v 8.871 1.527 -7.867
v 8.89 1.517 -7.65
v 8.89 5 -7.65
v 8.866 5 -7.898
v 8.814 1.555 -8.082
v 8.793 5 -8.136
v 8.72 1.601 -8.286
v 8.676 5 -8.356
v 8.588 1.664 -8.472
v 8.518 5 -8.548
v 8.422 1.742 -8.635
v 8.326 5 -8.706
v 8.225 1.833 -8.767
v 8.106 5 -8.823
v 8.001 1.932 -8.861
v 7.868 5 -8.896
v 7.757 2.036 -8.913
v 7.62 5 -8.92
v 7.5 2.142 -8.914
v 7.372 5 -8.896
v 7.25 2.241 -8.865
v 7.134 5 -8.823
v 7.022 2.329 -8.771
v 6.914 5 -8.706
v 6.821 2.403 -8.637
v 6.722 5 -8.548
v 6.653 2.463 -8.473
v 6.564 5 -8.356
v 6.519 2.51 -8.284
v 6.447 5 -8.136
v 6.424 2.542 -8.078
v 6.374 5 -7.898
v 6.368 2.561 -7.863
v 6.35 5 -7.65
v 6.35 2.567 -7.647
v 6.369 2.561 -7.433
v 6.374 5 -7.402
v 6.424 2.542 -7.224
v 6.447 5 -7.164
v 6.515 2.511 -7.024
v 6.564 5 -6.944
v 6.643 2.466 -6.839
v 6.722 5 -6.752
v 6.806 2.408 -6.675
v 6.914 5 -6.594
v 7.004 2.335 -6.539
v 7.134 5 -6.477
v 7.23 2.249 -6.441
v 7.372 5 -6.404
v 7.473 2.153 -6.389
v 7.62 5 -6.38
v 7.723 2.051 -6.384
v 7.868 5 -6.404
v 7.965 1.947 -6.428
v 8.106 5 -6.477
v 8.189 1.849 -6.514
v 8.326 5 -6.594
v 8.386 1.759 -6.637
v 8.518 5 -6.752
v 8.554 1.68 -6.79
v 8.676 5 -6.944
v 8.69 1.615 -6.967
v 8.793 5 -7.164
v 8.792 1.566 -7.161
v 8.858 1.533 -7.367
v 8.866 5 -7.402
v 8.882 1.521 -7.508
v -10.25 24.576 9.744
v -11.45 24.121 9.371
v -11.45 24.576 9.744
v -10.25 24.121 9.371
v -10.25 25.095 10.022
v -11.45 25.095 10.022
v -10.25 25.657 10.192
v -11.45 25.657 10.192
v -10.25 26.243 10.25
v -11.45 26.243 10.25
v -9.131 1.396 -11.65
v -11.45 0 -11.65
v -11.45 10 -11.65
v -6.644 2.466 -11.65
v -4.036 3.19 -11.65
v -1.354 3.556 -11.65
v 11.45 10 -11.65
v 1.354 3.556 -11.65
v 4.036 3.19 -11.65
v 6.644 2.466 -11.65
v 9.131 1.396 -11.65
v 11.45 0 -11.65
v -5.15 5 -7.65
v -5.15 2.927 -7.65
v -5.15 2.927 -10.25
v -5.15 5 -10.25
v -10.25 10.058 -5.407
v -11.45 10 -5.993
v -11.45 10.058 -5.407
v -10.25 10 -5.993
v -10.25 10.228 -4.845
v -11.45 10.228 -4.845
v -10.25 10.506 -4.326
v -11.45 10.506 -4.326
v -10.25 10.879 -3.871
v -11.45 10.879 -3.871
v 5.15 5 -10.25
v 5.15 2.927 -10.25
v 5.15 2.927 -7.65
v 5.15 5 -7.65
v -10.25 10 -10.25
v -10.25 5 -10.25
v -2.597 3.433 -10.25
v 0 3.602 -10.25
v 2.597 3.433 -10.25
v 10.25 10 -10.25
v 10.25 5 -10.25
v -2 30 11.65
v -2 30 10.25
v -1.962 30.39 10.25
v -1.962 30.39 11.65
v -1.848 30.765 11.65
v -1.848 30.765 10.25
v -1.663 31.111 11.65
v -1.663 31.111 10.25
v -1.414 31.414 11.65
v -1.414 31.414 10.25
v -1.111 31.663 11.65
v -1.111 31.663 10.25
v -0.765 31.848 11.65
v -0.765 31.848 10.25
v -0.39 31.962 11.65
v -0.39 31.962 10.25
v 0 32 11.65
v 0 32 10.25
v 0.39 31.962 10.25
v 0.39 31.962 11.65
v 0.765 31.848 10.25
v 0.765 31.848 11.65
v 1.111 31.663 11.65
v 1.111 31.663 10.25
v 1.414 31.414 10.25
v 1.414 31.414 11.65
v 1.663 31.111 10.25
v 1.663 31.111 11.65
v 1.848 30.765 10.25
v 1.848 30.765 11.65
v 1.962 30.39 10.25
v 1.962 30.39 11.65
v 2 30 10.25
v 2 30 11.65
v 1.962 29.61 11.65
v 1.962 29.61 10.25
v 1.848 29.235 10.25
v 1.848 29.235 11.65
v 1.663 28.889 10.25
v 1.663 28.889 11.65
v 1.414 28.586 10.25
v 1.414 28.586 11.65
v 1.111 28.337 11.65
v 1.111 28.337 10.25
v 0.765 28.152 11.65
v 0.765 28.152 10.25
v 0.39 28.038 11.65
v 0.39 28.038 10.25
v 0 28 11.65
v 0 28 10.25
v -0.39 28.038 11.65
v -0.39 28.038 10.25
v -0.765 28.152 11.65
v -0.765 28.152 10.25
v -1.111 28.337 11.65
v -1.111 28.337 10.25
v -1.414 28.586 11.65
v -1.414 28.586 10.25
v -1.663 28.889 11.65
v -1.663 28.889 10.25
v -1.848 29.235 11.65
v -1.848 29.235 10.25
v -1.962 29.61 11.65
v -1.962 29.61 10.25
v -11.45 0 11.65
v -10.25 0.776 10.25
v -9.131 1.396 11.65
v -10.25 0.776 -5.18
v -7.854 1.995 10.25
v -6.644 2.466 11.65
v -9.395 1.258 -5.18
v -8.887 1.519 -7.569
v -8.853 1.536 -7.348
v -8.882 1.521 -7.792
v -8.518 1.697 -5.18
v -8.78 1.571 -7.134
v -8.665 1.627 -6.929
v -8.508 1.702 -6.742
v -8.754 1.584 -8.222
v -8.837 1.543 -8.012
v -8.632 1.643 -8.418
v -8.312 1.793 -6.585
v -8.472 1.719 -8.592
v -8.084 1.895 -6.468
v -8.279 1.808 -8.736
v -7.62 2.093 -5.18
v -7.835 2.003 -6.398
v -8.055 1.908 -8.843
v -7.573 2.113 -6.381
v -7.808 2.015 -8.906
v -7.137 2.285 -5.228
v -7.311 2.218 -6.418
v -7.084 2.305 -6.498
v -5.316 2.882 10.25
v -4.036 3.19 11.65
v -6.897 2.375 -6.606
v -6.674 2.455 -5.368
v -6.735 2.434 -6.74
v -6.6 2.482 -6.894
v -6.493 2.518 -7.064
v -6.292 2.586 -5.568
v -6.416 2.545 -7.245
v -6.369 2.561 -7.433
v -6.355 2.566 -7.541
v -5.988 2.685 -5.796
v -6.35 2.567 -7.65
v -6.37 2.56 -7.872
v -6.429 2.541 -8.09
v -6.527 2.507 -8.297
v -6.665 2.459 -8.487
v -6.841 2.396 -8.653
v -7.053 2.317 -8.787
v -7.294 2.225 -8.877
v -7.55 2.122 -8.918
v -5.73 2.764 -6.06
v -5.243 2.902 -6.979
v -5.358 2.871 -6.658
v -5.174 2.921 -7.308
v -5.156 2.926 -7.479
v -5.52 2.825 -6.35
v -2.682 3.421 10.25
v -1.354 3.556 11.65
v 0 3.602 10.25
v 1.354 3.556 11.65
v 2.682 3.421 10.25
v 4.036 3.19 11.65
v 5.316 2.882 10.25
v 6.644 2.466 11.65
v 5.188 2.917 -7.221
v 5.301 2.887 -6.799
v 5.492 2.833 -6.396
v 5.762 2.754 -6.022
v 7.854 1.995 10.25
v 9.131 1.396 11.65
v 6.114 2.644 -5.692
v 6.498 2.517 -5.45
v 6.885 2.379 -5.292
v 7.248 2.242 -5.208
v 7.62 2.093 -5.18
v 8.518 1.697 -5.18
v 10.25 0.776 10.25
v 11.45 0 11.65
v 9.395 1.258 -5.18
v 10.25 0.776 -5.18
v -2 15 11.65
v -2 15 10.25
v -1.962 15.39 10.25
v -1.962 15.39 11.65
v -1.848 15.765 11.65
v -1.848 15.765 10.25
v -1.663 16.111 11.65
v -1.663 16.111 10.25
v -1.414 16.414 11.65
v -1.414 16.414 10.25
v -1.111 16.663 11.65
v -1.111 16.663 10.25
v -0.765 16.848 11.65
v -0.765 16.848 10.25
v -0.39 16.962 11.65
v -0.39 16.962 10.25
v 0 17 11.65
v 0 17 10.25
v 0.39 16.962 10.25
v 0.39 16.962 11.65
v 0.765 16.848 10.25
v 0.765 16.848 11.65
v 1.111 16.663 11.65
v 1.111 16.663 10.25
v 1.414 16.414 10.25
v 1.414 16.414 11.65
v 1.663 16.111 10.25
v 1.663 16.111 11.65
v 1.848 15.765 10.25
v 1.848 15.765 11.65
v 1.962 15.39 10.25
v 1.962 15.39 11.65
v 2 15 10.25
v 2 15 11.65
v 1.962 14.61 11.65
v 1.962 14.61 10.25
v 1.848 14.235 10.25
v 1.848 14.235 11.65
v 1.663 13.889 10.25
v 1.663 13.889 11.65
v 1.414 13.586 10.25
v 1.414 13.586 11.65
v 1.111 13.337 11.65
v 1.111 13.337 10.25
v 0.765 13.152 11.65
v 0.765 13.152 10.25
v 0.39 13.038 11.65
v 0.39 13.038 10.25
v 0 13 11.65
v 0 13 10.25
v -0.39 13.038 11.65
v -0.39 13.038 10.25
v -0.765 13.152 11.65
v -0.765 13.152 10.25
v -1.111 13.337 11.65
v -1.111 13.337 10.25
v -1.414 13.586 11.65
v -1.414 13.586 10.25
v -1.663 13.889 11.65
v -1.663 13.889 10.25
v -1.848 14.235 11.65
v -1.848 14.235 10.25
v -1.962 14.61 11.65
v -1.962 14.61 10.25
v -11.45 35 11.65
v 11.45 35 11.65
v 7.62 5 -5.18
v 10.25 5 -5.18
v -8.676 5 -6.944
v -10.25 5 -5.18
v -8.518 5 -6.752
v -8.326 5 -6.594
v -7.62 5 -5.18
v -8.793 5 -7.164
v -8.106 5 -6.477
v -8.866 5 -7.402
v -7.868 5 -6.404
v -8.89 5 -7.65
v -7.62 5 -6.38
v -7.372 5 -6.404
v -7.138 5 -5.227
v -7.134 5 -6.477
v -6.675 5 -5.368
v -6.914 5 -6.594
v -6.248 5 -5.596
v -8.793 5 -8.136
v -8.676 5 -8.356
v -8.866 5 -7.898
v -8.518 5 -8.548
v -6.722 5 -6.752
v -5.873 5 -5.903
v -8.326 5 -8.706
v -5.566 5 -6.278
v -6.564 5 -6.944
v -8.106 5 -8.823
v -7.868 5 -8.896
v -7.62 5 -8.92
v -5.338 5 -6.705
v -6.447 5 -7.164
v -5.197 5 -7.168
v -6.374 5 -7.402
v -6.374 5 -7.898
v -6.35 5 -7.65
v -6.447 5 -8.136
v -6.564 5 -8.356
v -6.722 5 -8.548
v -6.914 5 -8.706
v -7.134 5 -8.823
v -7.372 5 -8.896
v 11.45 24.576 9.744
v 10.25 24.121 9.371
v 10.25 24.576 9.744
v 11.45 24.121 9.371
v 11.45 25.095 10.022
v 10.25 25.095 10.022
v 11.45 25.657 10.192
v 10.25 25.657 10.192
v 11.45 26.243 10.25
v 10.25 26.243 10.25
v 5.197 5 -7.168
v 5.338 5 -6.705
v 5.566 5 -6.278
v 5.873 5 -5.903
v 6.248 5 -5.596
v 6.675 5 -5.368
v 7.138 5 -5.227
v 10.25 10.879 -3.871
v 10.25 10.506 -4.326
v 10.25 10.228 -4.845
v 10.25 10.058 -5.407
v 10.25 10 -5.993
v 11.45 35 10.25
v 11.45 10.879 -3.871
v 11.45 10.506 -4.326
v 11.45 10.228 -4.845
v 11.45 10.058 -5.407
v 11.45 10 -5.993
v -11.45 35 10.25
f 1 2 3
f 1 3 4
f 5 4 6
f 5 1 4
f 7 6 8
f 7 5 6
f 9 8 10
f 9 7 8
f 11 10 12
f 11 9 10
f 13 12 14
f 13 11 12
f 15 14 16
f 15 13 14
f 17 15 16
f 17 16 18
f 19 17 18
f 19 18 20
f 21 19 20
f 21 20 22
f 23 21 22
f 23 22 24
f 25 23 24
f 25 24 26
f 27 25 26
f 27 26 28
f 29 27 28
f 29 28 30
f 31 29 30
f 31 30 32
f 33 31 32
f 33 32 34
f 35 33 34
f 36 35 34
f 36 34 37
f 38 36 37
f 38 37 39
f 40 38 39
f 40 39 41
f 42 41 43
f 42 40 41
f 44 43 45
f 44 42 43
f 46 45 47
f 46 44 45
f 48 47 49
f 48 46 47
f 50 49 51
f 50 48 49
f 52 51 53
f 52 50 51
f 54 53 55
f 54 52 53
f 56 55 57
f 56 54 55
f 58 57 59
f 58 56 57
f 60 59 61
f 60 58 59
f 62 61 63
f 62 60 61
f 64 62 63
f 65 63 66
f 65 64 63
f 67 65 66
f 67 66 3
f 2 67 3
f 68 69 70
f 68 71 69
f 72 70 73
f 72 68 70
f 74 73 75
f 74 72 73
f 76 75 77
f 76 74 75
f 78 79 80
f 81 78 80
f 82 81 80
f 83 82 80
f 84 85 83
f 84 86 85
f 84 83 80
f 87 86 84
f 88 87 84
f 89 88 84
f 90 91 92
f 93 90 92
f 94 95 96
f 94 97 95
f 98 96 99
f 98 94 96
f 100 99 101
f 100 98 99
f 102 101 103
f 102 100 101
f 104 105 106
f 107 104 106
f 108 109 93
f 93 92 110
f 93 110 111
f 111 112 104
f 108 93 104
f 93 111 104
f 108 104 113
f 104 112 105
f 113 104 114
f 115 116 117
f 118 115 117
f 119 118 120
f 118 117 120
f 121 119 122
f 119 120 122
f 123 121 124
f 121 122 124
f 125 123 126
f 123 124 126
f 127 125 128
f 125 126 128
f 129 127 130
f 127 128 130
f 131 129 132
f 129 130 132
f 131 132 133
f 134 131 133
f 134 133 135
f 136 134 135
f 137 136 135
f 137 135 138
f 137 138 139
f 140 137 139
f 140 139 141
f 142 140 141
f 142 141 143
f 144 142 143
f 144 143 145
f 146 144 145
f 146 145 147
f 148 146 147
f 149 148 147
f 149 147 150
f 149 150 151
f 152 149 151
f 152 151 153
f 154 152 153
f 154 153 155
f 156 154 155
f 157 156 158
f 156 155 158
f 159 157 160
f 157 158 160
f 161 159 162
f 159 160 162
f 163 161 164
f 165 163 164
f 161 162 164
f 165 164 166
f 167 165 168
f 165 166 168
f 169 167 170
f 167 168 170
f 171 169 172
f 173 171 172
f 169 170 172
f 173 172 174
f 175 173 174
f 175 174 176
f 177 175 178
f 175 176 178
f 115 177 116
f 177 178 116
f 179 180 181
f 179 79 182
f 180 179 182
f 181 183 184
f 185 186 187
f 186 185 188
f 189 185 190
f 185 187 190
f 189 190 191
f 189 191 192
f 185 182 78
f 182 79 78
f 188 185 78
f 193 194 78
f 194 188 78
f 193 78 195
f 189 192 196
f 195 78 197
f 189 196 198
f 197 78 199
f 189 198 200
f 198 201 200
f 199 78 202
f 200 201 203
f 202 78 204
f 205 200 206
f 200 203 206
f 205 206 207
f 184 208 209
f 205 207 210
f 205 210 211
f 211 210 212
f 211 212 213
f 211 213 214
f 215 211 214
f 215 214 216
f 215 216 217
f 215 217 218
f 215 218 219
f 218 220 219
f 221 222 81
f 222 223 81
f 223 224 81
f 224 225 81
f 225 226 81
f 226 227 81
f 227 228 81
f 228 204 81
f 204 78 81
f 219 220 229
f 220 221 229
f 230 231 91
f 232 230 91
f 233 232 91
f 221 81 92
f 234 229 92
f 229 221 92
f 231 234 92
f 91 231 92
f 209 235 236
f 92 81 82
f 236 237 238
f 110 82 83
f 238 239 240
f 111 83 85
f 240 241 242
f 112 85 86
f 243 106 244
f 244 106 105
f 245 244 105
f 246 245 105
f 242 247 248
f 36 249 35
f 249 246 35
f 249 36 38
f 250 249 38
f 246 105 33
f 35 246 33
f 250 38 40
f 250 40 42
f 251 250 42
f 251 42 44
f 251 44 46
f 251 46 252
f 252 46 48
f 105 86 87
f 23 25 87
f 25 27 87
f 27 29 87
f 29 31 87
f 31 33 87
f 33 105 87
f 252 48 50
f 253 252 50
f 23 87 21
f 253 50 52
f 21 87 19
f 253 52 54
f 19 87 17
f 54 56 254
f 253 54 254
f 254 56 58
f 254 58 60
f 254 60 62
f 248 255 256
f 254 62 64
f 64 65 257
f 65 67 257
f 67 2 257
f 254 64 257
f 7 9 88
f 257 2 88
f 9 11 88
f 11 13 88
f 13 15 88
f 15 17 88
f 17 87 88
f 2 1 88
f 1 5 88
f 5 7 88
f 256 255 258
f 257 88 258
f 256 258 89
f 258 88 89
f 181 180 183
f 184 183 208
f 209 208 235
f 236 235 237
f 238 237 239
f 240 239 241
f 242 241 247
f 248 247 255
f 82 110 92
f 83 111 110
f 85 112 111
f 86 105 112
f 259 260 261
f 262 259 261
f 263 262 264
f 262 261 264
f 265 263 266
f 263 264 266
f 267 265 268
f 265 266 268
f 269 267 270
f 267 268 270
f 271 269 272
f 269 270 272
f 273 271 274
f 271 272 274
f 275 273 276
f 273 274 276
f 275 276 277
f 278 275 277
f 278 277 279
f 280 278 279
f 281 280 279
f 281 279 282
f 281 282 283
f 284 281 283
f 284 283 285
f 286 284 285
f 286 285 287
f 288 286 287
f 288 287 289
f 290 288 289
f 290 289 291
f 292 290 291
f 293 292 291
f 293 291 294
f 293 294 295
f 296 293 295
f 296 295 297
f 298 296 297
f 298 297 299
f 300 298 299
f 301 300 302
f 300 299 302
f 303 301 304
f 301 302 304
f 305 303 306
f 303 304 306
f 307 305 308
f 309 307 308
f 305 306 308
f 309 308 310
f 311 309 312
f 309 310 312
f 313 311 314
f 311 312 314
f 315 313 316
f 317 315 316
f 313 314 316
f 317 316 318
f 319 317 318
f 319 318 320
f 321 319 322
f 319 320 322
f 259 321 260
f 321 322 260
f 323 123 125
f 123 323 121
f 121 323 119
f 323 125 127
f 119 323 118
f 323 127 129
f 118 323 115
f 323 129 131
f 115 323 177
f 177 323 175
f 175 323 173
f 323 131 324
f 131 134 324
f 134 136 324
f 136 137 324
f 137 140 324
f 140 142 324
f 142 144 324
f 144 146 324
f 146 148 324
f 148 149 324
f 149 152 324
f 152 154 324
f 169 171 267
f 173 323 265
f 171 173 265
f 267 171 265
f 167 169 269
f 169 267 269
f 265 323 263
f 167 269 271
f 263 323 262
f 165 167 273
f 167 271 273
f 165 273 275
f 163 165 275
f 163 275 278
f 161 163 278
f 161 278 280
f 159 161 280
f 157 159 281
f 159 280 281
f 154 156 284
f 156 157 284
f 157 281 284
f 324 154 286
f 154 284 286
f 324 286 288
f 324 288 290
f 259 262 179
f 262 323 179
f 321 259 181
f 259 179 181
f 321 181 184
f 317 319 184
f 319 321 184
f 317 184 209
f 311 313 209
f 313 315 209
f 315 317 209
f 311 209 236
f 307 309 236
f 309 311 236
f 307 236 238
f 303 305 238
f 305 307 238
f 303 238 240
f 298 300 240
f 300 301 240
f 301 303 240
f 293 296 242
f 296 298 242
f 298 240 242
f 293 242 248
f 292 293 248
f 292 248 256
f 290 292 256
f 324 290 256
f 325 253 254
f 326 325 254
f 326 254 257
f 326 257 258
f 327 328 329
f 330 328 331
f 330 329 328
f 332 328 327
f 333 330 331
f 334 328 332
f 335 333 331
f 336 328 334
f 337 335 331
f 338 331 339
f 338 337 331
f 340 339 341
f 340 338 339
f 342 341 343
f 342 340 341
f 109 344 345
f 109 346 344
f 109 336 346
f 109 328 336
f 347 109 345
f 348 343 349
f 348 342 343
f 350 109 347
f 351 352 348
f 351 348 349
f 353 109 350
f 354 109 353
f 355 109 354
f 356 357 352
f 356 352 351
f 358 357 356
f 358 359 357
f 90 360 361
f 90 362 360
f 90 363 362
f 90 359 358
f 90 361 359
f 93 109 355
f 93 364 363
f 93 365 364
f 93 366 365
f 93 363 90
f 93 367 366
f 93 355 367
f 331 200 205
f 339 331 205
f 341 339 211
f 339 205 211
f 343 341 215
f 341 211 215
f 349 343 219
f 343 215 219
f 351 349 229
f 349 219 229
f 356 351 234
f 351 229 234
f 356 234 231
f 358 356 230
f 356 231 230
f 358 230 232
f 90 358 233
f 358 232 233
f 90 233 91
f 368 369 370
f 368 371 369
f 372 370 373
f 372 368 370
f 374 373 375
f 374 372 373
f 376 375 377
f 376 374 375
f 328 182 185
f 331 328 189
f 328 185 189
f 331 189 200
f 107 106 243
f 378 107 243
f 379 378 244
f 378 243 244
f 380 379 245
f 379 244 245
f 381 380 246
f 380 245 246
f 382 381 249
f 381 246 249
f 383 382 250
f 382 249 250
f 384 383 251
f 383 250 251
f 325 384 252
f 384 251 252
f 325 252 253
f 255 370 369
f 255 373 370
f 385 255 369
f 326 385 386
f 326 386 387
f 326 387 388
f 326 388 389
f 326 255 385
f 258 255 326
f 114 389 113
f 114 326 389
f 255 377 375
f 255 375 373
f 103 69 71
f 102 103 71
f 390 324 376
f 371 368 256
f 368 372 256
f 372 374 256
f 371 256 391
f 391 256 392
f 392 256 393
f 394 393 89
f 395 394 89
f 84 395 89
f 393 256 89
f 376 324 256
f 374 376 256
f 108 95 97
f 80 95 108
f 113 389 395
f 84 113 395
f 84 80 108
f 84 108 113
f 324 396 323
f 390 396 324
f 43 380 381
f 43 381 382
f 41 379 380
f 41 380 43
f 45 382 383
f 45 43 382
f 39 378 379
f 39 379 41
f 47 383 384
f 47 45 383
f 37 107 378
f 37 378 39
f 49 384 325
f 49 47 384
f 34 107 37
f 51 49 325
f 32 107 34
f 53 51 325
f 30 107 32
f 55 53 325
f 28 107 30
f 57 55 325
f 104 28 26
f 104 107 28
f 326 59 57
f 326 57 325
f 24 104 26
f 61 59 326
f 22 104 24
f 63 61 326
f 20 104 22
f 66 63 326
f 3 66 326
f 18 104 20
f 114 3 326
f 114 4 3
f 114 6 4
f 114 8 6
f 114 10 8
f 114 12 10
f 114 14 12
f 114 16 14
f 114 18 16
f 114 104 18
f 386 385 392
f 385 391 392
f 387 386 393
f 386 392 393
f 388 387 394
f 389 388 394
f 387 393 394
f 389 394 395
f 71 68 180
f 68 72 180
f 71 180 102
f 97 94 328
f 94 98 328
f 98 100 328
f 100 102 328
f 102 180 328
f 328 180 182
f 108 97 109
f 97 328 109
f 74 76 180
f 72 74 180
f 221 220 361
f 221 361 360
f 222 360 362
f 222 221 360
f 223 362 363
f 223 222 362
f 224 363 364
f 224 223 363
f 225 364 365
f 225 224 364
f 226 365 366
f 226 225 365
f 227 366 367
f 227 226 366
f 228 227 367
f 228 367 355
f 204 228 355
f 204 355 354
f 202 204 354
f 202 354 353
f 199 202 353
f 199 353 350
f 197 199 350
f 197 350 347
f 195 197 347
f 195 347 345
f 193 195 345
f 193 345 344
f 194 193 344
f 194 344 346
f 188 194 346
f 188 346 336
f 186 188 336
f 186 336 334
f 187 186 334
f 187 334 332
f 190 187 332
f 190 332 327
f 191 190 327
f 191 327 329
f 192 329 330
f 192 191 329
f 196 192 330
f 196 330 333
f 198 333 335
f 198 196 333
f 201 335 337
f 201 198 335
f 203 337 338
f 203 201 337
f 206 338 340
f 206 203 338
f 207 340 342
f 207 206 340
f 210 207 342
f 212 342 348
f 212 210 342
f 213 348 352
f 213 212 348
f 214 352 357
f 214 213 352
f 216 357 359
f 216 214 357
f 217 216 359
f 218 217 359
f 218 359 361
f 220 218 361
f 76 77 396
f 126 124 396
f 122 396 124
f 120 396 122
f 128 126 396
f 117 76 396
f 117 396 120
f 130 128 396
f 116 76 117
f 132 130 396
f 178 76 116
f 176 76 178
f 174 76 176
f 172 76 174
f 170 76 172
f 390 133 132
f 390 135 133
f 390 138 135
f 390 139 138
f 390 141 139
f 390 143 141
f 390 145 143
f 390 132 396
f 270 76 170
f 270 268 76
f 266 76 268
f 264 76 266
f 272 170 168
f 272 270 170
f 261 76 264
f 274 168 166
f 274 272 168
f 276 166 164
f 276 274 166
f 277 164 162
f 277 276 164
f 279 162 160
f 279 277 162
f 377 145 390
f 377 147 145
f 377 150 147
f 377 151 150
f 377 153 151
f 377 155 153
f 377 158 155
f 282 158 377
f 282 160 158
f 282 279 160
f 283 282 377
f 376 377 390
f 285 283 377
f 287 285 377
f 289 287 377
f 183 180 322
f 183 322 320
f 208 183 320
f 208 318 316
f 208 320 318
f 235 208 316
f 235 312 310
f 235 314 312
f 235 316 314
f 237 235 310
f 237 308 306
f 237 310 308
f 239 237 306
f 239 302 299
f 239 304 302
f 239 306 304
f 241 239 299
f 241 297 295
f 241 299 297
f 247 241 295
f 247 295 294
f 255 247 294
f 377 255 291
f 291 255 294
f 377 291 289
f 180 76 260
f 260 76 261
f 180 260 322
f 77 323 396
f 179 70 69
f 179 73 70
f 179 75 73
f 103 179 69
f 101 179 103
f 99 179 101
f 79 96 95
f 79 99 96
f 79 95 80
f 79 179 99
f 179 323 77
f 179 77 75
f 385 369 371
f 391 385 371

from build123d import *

# Parameters (mm, degrees)
SKETCH_1_W          = 22.9
SKETCH_1_H          = 23.3
SKETCH_1_W_2        = 20.5
SKETCH_1_H_2        = 20.5
EXTRUDE_1_DEPTH     = 10
SKETCH_1_4_R        = 1.27
EXTRUDE_2_DEPTH     = 5
EXTRUDE_3_DEPTH     = 10
SKETCH_3_W          = 22.9
SKETCH_3_H          = 1.4
EXTRUDE_4_DEPTH     = 25
CUT_EXTRUDE_1_REACH = 45.577
SKETCH_4_R          = 20
SKETCH_5_R          = 2
CUT_EXTRUDE_2_DEPTH = 43.84521568
CHAMFER_1_SIZE      = 15
FILLET_1_R          = 3


with BuildPart() as part:
    # 草图1 → 凸台-拉伸1 (new body)
    with BuildSketch(Plane(origin=(0, 0, 0), x_dir=(1, 0, 0), z_dir=(0, 1, 0))):
        Rectangle(SKETCH_1_W, SKETCH_1_H)
        Rectangle(SKETCH_1_W_2, SKETCH_1_H_2, mode=Mode.SUBTRACT)
    extrude(amount=EXTRUDE_1_DEPTH)

    # 草图1<4> → 凸台-拉伸2 (add)
    # profile 1 of 2: a face of its own
    with BuildSketch(Plane(origin=(0, 0, 0), x_dir=(1, 0, 0), z_dir=(0, 1, 0))):
        with BuildLine():
            Line((-5.15, 10.25), (-10.25, 10.25))
            Line((-10.25, 10.25), (-10.25, 5.18))
            Line((-10.25, 5.18), (-7.62, 5.18))
            ThreePointArc((-7.62, 5.18), (-5.87344625, 5.90344625), (-5.15, 7.65))
            Line((-5.15, 7.65), (-5.15, 10.25))
        make_face()
        with Locations((-7.62, 7.65)):
            Circle(SKETCH_1_4_R, mode=Mode.SUBTRACT)
    # profile 2 of 2: a face of its own
    with BuildSketch(Plane(origin=(0, 0, 0), x_dir=(1, 0, 0), z_dir=(0, 1, 0))):
        with BuildLine():
            Line((10.25, 10.25), (5.15, 10.25))
            Line((5.15, 10.25), (5.15, 7.65))
            ThreePointArc((5.15, 7.65), (5.87344625, 5.90344625), (7.62, 5.18))
            Line((7.62, 5.18), (10.25, 5.18))
            Line((10.25, 5.18), (10.25, 10.25))
        make_face()
        with Locations((7.62, 7.65)):
            Circle(SKETCH_1_4_R, mode=Mode.SUBTRACT)
    extrude(amount=EXTRUDE_2_DEPTH)

    # 草图1<5> → 凸台-拉伸3 (add)
    with BuildSketch(Plane(origin=(0, 0, 0), x_dir=(1, 0, 0), z_dir=(0, 1, 0))):
        Polygon((10.25, -10.25), (-10.25, -10.25), (-11.45, -10.25), (-11.45, -11.65), (11.45, -11.65), (11.45, -10.25), align=None)
    extrude(amount=EXTRUDE_3_DEPTH)

    # 草图3 → 凸台-拉伸4 (add)
    with BuildSketch(Plane(origin=(0, 10, 0), x_dir=(1, 0, 0), z_dir=(0, 1, 0))):
        with Locations((0, -10.95)):
            Rectangle(SKETCH_3_W, SKETCH_3_H)
    extrude(amount=EXTRUDE_4_DEPTH)

    # 草图4 → 切除-拉伸1 (cut, up to next)
    with BuildSketch(Plane(origin=(0, 0, -11.65), x_dir=(-1, 0, 0), z_dir=(0, 0, -1)), mode=Mode.PRIVATE) as cut_extrude_1_sk1:
        with Locations((0, -16.398094401)):
            Circle(SKETCH_4_R)
    cut_extrude_1_tool1 = extrude(cut_extrude_1_sk1.sketch, amount=-CUT_EXTRUDE_1_REACH, mode=Mode.PRIVATE) & part.part
    add(cut_extrude_1_tool1.solids().sort_by_distance((0, -16.398094, -11.65))[0], mode=Mode.SUBTRACT)

    # 草图5 → 切除-拉伸2 (cut, through all)
    with BuildSketch(Plane(origin=(0, 0, 10.25), x_dir=(-1, 0, 0), z_dir=(0, 0, -1))):
        with Locations((0, 15)):
            Circle(SKETCH_5_R)
        with Locations((0, 30)):
            Circle(SKETCH_5_R)
    extrude(amount=-CUT_EXTRUDE_2_DEPTH, mode=Mode.SUBTRACT)

    # 倒角1
    chamfer_1_edges = [part.edges().sort_by_distance(p)[0] for p in [
        (10.85, 10, 10.25),
        (-10.85, 10, 10.25),
    ]]
    chamfer(chamfer_1_edges, length=CHAMFER_1_SIZE)

    # 圆角1
    fillet_1_edges = [part.edges().sort_by_distance(p)[0] for p in [
        (10.85, 10, -4.75),
        (10.85, 25, 10.25),
        (-10.85, 25, 10.25),
        (-10.85, 10, -4.75),
    ]]
    fillet(fillet_1_edges, radius=FILLET_1_R)


solid = part.part
